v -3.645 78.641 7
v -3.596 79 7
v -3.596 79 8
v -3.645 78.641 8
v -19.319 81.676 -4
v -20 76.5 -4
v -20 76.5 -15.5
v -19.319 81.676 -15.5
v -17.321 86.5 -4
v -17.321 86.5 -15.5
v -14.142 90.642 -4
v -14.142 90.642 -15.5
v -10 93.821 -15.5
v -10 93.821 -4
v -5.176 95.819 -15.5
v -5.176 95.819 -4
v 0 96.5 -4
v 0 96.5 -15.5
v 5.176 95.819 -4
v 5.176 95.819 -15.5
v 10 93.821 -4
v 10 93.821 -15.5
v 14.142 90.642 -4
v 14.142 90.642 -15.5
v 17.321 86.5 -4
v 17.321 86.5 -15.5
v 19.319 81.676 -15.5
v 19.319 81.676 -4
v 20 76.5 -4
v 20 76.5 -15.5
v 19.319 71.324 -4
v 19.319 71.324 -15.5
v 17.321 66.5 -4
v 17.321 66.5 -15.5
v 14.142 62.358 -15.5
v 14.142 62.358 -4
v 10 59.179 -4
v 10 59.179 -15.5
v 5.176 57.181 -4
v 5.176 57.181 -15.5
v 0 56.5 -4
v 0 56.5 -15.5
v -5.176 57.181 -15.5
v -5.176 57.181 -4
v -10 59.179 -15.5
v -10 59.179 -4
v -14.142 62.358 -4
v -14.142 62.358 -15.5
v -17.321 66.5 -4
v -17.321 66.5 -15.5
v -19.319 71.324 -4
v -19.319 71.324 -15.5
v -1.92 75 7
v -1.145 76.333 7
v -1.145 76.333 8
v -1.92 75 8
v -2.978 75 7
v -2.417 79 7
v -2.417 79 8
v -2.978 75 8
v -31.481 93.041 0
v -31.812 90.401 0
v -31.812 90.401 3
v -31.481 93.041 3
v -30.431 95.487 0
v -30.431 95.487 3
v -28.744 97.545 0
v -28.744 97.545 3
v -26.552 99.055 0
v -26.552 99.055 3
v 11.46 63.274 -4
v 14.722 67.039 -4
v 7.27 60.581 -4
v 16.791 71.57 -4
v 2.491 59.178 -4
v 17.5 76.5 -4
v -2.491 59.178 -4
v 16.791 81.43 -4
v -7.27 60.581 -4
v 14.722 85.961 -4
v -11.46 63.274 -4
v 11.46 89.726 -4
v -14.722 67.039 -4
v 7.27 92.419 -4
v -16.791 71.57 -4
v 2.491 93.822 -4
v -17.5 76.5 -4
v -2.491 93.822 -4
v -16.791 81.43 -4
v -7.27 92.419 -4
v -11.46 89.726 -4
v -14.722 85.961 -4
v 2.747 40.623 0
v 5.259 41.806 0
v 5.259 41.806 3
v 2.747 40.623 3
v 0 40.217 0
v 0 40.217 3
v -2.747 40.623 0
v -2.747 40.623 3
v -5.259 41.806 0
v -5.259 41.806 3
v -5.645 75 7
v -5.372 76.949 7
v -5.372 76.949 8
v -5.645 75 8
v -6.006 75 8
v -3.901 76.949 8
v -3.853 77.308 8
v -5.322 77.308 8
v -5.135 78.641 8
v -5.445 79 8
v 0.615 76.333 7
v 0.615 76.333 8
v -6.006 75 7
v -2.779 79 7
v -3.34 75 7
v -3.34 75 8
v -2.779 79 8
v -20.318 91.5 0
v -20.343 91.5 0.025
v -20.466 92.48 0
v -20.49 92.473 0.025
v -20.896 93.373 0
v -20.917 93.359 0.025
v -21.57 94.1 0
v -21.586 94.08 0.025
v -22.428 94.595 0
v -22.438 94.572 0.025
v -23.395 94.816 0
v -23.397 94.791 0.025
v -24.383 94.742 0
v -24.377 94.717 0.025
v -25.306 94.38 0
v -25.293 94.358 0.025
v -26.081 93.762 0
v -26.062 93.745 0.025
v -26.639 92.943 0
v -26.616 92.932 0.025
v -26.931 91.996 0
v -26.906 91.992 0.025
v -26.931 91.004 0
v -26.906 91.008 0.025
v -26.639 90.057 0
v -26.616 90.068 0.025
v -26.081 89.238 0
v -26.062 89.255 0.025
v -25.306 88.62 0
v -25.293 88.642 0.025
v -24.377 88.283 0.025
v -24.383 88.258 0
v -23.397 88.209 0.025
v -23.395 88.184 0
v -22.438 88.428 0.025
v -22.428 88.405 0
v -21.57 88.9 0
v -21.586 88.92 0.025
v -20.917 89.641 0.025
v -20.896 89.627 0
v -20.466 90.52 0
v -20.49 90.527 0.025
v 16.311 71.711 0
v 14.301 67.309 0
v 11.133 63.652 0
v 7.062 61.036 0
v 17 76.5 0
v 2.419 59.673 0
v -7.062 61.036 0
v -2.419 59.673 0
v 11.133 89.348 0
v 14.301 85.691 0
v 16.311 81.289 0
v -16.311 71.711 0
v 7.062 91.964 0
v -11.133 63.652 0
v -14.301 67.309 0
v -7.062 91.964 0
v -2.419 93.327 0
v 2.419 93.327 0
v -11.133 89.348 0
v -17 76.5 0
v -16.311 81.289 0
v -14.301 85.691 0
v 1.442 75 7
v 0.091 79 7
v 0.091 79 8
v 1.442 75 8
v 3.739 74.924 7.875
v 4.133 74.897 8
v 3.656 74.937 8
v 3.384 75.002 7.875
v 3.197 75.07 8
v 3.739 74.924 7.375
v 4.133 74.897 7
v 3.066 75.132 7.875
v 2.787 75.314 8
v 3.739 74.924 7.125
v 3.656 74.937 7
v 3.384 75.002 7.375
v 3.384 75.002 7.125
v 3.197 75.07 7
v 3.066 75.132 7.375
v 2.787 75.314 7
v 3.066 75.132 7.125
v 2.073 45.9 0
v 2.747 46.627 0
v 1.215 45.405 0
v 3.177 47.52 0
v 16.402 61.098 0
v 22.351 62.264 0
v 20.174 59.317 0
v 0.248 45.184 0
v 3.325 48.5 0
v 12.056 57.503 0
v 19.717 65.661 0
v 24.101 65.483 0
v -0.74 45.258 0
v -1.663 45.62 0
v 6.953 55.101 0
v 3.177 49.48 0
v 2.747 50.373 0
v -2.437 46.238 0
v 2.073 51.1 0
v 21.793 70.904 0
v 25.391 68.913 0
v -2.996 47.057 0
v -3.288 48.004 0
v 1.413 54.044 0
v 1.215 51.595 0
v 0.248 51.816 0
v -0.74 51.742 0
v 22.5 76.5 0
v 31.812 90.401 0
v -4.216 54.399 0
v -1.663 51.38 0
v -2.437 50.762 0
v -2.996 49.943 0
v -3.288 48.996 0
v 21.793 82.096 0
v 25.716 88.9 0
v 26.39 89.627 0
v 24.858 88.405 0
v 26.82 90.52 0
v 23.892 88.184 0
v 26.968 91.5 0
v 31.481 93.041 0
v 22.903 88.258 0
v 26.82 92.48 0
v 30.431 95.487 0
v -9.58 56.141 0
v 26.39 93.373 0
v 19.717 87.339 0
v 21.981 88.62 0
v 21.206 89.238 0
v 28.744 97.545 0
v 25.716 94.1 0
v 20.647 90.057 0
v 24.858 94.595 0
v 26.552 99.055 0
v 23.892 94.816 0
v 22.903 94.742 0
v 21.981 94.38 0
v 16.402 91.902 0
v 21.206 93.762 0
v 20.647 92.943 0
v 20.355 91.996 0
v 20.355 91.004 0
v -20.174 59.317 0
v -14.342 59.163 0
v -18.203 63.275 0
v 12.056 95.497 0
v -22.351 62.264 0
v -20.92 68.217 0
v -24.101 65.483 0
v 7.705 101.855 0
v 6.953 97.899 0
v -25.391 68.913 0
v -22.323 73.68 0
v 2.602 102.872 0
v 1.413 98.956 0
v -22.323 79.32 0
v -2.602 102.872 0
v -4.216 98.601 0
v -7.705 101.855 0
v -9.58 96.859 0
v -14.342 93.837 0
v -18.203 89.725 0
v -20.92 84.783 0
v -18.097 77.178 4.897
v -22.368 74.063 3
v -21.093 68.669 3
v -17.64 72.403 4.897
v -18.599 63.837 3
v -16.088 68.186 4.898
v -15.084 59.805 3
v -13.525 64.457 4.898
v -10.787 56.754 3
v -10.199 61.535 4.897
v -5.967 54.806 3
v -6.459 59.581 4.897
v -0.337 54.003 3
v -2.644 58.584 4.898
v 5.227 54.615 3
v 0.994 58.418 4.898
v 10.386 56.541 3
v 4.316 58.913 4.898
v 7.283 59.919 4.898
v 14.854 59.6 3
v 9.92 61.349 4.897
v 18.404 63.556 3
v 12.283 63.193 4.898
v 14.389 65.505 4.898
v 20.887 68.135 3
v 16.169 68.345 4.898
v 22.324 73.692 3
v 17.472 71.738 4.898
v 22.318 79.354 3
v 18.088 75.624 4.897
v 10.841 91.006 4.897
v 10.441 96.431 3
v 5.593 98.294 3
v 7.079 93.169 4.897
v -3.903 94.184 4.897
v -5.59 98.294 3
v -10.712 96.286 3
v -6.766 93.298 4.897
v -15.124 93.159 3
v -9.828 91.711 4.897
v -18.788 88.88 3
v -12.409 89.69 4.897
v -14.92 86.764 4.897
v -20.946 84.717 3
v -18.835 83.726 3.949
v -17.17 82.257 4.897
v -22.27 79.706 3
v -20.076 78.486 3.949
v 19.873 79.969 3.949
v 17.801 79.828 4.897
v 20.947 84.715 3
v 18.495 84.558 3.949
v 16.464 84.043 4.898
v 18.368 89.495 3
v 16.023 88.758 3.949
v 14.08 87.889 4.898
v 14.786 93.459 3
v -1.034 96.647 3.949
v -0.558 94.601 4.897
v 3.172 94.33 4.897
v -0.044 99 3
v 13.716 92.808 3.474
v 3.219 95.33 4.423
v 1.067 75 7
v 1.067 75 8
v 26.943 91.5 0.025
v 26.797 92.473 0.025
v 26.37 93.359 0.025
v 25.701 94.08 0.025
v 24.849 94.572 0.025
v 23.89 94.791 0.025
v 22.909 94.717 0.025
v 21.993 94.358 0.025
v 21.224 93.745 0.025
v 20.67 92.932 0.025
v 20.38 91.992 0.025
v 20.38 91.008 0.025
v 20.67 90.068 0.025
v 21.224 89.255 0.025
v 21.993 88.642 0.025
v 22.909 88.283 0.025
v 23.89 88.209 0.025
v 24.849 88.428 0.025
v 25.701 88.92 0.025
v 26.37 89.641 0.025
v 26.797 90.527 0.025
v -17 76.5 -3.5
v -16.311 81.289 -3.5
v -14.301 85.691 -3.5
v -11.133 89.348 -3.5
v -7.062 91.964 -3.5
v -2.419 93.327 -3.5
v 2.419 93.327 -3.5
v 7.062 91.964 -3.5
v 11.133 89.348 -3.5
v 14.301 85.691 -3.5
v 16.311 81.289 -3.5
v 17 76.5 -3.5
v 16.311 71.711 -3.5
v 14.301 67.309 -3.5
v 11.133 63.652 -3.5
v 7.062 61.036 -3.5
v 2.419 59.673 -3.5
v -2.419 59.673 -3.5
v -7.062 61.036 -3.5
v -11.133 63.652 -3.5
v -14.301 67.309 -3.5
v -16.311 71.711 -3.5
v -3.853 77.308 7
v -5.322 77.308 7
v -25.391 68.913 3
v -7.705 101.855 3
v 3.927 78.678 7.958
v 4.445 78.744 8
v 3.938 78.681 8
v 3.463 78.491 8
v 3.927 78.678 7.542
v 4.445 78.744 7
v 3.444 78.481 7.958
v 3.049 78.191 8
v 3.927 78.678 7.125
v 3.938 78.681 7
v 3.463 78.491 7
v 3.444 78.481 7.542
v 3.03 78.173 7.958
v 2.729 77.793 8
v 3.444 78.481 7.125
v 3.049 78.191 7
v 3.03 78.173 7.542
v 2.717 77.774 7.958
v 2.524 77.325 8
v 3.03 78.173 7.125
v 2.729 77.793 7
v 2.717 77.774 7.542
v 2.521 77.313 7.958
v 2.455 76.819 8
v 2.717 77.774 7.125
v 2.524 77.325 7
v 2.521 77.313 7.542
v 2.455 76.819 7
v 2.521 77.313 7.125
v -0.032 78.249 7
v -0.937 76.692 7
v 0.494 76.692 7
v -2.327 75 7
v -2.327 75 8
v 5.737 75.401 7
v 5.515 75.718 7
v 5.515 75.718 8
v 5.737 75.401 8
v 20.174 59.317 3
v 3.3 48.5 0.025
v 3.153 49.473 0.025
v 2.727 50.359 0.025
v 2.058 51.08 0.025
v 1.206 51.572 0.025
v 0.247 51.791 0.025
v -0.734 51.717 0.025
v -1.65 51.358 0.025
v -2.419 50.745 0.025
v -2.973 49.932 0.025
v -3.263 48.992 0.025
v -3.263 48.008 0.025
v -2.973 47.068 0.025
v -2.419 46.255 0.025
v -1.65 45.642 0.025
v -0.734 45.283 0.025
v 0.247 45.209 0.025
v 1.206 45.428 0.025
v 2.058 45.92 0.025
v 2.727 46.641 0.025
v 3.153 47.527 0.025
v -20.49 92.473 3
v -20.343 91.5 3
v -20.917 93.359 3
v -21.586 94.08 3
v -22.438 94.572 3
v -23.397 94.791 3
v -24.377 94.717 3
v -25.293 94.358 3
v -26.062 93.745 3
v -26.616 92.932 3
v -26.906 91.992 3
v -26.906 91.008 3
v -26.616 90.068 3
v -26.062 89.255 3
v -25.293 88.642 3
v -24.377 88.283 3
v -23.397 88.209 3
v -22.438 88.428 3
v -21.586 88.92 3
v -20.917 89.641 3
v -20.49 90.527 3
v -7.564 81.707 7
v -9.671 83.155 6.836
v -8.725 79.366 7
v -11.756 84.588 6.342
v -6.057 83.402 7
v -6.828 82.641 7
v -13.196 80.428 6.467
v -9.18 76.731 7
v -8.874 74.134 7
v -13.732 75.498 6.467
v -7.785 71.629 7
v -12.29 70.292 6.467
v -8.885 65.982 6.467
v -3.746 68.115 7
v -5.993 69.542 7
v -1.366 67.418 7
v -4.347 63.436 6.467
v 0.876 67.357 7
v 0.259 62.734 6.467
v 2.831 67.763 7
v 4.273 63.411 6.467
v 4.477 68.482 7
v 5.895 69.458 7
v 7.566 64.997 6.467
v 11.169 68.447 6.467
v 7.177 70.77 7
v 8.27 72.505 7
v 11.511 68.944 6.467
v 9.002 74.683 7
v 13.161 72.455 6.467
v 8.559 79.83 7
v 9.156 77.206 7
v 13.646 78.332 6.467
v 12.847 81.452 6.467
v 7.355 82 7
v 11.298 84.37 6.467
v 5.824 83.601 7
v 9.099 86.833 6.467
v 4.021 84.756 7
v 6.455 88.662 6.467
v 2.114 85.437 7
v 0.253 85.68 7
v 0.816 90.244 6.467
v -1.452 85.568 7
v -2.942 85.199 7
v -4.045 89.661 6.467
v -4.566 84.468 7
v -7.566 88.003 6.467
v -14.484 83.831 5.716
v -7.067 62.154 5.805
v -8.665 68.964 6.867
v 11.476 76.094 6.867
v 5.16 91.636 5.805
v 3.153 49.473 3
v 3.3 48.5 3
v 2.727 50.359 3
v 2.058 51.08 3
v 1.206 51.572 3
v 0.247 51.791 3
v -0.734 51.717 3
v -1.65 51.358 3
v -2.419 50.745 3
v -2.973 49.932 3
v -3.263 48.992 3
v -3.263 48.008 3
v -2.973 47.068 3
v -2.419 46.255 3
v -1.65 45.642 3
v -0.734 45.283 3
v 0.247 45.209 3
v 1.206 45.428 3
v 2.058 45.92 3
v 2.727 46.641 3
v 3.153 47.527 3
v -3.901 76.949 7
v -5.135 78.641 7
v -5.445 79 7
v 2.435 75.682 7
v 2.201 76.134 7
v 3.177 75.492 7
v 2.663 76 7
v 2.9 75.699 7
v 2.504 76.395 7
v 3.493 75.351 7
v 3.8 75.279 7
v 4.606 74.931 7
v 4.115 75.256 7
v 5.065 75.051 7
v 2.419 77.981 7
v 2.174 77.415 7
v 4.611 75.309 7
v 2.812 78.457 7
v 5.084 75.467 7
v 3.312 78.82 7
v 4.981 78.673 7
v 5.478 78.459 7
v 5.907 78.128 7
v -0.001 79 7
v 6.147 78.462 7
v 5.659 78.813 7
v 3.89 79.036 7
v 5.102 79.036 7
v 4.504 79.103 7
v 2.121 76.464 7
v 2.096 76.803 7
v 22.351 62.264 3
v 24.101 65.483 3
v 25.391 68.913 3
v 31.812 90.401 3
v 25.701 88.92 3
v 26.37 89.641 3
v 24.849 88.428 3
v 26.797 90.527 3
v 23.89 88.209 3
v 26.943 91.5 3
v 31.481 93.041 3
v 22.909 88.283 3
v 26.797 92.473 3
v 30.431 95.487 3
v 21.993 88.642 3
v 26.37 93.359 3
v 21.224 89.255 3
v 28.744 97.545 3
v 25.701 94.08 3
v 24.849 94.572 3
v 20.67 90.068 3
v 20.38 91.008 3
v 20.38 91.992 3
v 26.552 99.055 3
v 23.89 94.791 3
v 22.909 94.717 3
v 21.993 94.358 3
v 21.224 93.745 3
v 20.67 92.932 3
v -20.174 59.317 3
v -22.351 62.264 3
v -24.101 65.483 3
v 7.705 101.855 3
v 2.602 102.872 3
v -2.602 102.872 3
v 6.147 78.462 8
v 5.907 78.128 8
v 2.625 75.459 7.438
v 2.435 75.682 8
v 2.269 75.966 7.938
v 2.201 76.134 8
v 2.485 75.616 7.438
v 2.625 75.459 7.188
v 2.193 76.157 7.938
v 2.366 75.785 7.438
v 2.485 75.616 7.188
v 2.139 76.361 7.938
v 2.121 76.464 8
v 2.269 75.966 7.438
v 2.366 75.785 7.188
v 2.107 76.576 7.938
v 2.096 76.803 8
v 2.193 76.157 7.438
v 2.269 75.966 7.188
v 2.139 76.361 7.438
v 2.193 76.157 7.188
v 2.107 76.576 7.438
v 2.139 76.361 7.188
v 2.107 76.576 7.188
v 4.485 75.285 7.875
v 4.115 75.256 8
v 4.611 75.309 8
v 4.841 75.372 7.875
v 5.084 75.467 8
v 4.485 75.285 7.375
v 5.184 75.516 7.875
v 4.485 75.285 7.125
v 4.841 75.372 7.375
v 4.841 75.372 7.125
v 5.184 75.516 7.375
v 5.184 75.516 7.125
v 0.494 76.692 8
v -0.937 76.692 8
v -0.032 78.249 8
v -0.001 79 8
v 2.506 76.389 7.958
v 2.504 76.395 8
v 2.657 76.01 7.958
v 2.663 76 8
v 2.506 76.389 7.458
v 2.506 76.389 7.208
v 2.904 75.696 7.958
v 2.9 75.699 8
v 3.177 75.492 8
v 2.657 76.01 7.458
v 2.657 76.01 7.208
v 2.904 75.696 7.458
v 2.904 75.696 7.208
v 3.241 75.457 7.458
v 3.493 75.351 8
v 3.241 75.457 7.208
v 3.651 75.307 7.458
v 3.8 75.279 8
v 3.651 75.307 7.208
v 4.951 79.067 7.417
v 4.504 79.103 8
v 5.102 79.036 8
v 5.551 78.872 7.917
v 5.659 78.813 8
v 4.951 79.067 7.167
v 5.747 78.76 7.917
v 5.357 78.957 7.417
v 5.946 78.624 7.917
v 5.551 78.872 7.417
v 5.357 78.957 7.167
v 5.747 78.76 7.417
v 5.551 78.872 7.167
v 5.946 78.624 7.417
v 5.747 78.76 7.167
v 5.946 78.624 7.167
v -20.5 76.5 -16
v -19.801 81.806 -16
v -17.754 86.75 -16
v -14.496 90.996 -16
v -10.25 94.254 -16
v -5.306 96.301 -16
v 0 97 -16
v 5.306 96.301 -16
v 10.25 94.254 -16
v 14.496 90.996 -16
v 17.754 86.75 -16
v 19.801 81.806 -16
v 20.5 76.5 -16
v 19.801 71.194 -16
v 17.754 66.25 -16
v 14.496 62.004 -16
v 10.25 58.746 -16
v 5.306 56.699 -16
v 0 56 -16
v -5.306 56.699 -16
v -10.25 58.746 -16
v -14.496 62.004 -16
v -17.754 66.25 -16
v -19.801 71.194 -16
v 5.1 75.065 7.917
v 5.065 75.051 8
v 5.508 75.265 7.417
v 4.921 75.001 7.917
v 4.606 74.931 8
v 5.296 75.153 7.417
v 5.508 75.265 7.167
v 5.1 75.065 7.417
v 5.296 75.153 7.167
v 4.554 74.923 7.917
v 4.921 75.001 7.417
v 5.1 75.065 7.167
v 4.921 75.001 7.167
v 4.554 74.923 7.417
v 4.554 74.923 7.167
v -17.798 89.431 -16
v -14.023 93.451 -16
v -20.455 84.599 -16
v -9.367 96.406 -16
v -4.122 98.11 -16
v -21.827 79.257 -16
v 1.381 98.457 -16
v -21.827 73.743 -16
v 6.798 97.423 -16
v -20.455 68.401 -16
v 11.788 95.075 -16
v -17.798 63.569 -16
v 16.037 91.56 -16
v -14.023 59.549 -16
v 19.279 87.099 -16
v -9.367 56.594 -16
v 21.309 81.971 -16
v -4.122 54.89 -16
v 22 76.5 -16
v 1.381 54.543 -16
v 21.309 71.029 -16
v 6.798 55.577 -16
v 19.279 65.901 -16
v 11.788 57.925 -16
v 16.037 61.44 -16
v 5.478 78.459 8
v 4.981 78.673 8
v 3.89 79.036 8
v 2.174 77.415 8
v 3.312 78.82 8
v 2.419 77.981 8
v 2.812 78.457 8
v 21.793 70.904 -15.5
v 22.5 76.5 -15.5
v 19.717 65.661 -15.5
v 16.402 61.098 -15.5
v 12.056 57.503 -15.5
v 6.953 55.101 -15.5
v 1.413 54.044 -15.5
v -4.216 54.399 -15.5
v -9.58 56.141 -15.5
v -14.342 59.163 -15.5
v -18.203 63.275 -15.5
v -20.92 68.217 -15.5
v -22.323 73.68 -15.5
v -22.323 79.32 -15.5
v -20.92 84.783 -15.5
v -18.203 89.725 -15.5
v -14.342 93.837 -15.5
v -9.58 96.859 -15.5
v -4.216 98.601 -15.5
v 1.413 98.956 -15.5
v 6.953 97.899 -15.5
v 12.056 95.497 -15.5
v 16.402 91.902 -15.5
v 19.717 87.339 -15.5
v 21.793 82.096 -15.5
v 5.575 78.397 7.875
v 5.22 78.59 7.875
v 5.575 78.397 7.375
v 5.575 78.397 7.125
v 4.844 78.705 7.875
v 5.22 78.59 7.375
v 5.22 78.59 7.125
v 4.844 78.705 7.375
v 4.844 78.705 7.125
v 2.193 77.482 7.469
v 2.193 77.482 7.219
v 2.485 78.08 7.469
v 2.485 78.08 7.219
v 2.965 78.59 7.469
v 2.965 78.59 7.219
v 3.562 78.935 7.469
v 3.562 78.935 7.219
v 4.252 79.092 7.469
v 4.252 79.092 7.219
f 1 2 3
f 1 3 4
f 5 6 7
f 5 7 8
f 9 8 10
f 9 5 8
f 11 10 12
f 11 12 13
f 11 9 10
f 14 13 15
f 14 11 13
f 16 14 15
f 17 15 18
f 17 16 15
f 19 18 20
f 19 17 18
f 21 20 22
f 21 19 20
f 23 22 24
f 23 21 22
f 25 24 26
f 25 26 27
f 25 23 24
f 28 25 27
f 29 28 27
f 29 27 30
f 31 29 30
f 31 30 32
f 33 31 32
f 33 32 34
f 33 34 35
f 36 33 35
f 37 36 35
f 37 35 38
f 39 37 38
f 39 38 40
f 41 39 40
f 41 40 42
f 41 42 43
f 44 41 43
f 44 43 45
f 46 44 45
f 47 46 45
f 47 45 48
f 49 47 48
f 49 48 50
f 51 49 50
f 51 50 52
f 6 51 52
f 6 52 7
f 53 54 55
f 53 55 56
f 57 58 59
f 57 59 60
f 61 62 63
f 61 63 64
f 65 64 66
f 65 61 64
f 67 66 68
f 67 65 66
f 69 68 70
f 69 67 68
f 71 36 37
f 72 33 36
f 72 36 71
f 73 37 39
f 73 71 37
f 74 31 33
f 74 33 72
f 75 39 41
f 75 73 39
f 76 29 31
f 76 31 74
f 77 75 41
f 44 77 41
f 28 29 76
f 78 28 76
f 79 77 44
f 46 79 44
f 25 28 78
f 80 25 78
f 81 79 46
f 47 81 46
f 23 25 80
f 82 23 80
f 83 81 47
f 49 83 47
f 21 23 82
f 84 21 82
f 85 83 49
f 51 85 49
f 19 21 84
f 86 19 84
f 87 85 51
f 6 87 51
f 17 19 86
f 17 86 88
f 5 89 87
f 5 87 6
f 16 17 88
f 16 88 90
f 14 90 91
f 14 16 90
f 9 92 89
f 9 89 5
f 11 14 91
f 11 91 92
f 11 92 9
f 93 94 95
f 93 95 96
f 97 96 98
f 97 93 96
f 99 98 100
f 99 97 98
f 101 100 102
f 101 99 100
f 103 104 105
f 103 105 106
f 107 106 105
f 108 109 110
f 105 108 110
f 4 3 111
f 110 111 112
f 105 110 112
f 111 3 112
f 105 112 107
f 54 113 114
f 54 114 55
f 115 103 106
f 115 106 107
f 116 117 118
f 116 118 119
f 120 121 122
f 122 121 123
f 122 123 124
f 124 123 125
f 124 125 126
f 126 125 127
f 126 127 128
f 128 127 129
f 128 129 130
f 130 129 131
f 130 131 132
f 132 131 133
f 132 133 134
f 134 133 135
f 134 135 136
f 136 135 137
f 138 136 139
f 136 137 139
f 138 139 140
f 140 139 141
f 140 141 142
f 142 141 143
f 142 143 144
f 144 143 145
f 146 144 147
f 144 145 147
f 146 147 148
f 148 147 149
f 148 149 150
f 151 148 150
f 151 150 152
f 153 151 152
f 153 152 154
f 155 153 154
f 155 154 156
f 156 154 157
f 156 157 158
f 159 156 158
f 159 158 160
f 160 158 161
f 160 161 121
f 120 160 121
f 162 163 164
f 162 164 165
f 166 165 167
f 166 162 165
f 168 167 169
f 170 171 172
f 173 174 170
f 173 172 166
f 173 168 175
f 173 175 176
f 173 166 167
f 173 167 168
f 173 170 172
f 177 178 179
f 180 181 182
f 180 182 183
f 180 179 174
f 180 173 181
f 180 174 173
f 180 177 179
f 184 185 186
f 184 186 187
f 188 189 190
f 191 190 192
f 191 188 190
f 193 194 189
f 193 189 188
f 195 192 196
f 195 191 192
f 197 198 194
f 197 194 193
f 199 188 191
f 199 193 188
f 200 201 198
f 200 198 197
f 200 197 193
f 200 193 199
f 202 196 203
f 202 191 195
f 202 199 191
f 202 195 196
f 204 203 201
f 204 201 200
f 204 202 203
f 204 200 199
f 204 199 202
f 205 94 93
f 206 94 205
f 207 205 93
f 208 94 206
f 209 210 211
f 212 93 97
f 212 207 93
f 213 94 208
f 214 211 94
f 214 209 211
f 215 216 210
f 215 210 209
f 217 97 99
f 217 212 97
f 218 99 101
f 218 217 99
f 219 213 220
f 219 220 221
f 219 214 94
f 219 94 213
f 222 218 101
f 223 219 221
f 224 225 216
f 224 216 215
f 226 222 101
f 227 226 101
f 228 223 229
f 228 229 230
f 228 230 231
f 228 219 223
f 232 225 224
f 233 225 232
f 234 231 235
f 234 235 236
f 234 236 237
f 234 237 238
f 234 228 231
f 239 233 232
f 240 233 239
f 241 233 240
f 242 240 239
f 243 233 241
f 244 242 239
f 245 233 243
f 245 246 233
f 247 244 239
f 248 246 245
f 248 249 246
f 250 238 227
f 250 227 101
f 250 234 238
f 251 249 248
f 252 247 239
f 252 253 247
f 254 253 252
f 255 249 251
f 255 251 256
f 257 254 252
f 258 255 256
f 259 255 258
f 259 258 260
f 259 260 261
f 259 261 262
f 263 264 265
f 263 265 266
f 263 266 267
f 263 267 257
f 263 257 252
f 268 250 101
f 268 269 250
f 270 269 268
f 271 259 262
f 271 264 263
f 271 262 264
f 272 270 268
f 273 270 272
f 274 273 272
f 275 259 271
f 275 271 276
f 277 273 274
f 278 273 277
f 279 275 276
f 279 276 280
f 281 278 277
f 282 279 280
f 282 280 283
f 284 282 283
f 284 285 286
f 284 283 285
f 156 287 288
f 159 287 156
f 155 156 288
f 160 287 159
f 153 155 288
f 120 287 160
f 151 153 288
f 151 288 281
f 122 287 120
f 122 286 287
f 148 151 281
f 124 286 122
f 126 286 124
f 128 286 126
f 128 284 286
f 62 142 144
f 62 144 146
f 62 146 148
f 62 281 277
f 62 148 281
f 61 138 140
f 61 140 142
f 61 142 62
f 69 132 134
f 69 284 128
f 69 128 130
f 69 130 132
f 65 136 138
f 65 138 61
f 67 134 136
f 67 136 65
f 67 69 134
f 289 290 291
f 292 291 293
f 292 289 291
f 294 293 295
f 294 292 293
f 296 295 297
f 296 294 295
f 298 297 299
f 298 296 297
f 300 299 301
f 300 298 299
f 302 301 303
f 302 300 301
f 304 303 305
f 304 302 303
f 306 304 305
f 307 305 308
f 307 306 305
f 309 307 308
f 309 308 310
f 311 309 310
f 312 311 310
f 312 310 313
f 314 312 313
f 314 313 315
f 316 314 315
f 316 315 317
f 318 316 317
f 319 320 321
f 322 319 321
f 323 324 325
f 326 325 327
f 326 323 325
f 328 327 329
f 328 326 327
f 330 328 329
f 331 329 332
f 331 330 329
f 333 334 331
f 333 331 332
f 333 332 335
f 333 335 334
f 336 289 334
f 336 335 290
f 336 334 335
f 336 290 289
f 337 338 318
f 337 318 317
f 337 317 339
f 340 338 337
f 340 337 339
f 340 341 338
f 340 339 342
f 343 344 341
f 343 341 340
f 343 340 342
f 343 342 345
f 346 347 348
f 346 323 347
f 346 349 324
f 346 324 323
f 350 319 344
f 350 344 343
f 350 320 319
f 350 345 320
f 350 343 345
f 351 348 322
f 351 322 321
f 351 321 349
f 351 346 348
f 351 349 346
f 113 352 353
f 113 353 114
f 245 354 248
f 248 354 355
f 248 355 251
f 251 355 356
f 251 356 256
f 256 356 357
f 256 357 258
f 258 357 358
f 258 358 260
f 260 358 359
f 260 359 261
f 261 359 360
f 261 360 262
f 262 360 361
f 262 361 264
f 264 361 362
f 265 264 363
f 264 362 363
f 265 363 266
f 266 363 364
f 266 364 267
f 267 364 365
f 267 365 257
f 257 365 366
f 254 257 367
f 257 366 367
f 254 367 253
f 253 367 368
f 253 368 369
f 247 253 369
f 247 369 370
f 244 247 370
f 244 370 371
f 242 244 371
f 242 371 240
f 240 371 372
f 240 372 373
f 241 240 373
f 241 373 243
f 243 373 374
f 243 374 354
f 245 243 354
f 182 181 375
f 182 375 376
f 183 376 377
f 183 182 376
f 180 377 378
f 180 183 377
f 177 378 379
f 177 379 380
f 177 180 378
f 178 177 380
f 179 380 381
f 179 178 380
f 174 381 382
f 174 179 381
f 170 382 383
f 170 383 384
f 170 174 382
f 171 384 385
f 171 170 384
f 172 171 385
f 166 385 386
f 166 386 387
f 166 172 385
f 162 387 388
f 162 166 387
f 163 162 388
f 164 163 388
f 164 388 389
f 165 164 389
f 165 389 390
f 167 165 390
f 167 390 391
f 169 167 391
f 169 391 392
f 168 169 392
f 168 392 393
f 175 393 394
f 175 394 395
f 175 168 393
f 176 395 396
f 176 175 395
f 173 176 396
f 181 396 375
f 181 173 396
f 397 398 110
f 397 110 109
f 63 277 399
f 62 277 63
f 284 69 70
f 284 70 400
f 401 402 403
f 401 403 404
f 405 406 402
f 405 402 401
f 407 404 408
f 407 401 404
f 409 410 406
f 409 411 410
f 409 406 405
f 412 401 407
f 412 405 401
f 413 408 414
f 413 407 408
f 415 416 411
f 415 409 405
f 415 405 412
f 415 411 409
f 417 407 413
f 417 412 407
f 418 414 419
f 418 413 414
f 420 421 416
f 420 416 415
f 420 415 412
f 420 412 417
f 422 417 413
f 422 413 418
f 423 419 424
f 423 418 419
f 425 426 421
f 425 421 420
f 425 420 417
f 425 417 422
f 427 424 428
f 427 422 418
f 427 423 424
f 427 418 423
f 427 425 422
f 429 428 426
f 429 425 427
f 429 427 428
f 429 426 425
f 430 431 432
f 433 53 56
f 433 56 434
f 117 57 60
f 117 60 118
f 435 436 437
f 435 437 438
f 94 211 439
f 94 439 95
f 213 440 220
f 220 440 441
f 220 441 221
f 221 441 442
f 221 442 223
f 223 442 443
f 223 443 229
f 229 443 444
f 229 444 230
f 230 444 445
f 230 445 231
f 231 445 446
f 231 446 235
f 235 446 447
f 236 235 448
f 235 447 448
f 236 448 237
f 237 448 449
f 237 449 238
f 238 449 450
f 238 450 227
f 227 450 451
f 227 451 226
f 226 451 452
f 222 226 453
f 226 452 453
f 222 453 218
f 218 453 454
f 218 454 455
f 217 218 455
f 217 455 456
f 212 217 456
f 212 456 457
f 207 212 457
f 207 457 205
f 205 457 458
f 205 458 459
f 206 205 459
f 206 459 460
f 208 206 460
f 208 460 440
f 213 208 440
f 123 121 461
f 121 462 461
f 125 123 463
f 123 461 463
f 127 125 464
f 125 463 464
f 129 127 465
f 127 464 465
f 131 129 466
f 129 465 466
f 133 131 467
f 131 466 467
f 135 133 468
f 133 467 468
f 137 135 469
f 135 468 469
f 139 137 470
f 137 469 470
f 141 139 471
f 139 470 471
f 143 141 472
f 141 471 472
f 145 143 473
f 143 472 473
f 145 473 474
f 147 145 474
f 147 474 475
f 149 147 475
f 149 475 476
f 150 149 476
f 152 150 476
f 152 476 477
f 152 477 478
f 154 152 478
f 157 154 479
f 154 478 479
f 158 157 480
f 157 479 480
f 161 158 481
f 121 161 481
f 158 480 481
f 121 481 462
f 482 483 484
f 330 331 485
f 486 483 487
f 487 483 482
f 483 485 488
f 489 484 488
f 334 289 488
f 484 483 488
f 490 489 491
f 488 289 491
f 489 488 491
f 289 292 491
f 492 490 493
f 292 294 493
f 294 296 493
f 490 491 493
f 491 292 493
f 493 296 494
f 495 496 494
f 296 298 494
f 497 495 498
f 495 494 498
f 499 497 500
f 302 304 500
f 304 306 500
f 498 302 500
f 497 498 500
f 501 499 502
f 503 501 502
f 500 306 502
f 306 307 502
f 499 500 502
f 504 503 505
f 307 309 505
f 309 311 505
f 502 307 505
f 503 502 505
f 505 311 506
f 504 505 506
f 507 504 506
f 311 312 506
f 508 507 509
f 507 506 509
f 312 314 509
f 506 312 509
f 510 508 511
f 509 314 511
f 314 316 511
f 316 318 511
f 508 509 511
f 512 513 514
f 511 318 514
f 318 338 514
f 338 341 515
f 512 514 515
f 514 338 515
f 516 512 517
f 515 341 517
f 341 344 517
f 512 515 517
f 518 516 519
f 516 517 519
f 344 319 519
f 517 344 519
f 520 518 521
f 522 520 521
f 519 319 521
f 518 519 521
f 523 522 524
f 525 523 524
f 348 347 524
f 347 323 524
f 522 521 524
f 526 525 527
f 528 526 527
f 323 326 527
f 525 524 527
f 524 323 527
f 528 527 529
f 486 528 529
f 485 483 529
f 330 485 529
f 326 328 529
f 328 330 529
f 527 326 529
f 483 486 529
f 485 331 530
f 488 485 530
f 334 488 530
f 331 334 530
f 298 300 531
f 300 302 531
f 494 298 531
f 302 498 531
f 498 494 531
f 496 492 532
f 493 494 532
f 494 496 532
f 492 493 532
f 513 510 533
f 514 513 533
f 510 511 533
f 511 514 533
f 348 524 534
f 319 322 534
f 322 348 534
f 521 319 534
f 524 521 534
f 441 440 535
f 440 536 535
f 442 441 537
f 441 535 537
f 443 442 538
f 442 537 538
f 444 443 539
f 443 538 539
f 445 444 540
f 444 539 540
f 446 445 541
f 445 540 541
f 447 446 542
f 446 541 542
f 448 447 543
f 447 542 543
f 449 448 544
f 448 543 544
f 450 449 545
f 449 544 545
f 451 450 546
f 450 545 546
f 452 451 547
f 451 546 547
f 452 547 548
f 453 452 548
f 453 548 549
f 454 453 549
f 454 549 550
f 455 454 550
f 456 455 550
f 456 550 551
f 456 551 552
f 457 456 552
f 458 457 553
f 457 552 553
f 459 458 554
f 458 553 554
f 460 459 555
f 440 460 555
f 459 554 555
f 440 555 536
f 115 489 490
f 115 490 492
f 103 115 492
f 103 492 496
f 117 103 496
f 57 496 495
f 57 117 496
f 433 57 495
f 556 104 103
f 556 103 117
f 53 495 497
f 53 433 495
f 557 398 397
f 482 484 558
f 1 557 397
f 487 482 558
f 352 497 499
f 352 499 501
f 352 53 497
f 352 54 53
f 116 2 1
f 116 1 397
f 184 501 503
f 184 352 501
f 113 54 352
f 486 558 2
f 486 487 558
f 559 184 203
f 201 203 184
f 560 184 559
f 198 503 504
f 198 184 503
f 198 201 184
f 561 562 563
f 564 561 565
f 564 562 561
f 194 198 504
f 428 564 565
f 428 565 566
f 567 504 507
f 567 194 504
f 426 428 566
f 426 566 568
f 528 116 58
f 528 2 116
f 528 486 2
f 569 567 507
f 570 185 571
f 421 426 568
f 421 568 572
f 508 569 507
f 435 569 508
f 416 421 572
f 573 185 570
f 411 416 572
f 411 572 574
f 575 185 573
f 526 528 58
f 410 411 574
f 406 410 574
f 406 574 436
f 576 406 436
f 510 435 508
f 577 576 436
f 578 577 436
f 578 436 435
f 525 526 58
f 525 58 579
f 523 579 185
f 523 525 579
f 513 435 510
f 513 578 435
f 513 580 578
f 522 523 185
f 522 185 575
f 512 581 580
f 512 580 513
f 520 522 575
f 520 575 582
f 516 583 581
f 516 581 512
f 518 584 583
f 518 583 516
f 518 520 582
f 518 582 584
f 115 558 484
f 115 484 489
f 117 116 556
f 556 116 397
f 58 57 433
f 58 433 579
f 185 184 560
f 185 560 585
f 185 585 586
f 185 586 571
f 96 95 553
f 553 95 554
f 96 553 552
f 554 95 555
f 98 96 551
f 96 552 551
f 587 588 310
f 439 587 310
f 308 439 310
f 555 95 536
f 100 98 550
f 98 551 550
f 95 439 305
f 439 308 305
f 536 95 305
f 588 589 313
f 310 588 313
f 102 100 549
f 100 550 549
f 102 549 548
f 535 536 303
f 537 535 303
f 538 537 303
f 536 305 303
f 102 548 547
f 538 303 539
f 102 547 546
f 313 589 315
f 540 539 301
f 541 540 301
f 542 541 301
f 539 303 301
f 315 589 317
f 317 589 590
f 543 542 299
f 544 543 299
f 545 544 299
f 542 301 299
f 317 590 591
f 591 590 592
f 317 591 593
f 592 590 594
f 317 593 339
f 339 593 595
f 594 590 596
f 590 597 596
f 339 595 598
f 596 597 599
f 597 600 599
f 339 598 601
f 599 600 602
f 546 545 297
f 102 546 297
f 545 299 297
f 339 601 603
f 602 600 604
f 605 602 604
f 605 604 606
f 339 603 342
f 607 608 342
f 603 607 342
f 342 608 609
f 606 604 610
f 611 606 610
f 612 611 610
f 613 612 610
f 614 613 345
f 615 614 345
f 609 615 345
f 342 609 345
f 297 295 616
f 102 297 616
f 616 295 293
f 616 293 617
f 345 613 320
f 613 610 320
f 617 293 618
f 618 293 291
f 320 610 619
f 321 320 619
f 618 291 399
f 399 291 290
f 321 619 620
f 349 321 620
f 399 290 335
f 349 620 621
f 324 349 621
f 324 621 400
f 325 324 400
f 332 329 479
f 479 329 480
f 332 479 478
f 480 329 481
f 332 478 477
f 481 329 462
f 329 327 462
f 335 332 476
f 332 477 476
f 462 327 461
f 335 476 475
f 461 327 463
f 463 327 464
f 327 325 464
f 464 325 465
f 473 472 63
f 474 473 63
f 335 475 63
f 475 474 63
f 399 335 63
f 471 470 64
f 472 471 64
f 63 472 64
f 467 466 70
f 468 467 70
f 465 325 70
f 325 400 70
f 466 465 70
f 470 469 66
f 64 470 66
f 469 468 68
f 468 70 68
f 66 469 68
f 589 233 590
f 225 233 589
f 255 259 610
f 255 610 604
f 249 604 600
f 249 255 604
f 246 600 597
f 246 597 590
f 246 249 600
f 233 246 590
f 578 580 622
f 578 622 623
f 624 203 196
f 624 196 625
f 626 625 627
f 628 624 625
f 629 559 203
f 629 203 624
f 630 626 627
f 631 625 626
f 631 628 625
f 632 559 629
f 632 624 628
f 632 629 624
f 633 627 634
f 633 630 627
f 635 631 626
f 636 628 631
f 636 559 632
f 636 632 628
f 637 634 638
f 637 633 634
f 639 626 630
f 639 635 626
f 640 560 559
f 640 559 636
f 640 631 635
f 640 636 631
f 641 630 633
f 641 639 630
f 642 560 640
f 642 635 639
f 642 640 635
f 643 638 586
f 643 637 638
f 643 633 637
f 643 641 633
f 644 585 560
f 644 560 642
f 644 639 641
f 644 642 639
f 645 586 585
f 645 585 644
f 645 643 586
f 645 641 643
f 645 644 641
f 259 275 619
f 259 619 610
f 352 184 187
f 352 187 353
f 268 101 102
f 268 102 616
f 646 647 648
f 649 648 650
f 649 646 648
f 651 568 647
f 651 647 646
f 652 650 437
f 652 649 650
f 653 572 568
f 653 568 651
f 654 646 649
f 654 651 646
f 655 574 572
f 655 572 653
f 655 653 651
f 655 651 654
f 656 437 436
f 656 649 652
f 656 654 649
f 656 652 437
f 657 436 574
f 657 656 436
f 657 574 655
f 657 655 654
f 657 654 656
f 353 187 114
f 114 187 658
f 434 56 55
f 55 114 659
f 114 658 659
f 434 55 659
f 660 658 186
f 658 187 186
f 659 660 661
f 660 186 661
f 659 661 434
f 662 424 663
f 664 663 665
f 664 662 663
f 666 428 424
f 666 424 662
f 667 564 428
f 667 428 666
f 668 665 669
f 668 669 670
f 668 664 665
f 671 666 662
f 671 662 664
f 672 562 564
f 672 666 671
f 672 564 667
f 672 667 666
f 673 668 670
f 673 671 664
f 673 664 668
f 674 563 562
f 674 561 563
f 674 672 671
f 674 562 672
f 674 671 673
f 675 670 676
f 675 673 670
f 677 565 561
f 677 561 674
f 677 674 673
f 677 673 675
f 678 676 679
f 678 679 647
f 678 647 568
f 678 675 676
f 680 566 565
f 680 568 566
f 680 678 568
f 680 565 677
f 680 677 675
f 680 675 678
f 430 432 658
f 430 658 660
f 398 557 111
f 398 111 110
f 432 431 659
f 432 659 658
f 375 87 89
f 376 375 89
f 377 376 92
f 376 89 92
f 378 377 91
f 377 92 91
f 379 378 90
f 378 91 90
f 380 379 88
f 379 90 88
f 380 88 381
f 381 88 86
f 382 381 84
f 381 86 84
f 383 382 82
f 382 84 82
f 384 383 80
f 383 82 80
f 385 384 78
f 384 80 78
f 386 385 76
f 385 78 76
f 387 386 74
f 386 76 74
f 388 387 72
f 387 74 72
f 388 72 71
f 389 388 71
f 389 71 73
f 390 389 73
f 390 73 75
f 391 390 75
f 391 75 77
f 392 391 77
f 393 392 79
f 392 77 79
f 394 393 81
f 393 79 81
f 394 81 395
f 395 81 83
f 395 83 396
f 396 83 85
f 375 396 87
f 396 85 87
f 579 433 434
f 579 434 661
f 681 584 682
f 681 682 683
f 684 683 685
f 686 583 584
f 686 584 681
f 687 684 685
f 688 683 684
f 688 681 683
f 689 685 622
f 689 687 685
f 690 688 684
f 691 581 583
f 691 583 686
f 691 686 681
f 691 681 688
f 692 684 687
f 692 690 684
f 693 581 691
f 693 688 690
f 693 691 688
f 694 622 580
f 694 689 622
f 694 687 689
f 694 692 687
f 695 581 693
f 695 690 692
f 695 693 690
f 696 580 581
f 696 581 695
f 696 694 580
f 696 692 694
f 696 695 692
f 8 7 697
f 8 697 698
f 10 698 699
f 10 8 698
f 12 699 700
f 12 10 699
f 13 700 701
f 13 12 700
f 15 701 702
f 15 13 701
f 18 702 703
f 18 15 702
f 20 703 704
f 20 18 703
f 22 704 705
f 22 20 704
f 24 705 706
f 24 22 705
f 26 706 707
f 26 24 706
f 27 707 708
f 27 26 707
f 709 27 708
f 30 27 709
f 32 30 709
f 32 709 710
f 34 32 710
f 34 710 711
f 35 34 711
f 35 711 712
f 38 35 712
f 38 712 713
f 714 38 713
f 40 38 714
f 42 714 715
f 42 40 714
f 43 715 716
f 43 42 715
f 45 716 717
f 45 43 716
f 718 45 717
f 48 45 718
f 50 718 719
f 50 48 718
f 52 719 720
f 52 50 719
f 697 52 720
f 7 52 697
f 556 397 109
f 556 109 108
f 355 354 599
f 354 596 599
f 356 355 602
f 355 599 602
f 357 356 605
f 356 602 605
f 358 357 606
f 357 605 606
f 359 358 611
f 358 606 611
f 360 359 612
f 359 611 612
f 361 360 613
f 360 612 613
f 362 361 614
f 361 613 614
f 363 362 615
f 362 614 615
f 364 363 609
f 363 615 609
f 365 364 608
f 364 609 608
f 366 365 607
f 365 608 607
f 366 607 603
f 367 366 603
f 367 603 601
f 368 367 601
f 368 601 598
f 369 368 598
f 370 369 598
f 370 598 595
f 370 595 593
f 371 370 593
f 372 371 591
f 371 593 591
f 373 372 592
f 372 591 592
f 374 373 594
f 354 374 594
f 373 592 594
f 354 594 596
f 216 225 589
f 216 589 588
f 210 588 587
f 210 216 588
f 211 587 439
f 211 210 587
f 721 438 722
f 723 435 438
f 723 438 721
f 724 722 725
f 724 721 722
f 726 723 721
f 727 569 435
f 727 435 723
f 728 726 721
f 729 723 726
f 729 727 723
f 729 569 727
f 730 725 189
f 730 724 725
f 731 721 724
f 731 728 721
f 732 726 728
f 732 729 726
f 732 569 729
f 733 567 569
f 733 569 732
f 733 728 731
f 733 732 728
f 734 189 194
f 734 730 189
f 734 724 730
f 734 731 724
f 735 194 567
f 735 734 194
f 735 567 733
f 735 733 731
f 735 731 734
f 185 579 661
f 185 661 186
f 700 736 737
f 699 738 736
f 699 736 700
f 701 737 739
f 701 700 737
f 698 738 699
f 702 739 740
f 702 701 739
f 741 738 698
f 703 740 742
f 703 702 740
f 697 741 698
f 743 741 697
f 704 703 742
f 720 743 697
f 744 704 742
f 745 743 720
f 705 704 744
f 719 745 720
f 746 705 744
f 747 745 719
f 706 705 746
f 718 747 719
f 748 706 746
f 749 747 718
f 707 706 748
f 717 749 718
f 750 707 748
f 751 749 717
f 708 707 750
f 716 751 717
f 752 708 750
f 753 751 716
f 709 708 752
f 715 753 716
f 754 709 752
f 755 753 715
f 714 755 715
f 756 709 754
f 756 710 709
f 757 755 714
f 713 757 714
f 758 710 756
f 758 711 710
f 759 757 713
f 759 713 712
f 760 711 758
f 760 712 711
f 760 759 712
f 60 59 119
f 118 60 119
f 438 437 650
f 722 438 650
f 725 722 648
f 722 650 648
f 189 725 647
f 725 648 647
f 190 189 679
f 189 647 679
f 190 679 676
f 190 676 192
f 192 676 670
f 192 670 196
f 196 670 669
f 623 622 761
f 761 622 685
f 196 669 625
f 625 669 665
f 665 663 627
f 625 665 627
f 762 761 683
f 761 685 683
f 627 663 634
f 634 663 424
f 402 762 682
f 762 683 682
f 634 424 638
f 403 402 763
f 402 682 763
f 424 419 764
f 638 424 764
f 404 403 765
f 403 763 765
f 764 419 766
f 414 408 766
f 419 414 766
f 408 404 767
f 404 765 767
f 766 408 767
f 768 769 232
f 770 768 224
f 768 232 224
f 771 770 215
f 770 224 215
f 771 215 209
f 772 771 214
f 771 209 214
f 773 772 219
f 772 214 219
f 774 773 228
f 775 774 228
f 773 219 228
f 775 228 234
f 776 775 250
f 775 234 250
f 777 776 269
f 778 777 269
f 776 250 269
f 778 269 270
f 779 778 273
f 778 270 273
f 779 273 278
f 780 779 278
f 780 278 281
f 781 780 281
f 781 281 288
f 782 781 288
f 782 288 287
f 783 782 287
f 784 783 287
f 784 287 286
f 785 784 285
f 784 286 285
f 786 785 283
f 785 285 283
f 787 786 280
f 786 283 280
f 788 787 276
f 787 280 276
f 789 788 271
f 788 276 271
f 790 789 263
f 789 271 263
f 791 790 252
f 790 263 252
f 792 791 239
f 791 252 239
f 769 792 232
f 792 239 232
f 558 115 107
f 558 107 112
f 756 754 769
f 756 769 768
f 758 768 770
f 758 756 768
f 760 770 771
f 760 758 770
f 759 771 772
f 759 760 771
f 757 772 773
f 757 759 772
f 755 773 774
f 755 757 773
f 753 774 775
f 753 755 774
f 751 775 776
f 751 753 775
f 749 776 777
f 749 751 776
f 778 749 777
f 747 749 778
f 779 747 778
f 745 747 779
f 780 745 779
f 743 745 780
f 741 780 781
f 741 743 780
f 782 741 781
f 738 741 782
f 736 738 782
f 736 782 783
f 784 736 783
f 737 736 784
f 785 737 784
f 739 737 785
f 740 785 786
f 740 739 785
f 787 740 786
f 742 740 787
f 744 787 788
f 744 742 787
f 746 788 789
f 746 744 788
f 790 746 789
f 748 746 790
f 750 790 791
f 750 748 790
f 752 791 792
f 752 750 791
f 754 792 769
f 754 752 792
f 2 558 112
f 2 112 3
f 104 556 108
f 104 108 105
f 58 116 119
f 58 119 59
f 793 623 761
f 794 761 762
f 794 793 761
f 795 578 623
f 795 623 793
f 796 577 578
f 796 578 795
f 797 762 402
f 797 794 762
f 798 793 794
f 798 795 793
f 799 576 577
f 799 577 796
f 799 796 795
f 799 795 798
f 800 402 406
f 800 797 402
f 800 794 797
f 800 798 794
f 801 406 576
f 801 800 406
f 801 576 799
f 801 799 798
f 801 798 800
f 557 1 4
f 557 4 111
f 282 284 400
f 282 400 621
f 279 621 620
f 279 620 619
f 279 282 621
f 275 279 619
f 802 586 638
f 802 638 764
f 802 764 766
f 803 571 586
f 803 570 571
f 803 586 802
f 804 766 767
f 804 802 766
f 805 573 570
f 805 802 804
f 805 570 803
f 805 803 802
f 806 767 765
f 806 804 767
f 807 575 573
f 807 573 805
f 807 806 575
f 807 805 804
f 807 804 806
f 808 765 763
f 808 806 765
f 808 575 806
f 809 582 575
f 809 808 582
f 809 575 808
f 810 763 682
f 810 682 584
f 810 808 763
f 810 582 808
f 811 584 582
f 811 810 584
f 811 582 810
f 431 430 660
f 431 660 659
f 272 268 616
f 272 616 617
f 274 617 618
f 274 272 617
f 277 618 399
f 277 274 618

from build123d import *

# Parameters (mm, degrees)
ESTRUSIONE_ESTRUSIONE2_DEPTH   = 3
RACCORDO1_R                    = 20
FORO_PER_VITE_M6_1_D           = 6.6
FORO_PER_VITE_M6_1_CSINK_D     = 6.65
FORO_PER_VITE_M6_1_CSINK_ANGLE = 90
ESTRUSIONE_ESTRUSIONE4_DEPTH   = 1
SCHIZZO13_R                    = 22.5
SCHIZZO13_R_2                  = 20
ESTRUSIONE_ESTRUSIONE5_DEPTH   = 16
SMUSSO1_SIZE                   = 0.5
SCHIZZO14_R                    = 20
SCHIZZO14_R_2                  = 17
ESTRUSIONE_ESTRUSIONE6_DEPTH   = 4
SMUSSO2_SIZE                   = 0.5


with BuildPart() as part:
    # Schizzo2 → Estrusione-Estrusione2 (new body)
    with BuildSketch(Plane.XY):
        with BuildLine():
            Line((31.811628146, 90.400572067), (25.390622586, 68.91275513))
            ThreePointArc((25.390622586, 68.91275513), (23.282129475, 63.843284505), (20.174211359, 59.317124919))
            Line((20.174211359, 59.317124919), (5.259333821, 41.805742776))
            ThreePointArc((5.259333821, 41.805742776), (0, 40.217089549), (-5.259333821, 41.805742776))
            Line((-5.259333821, 41.805742776), (-20.174211359, 59.317124919))
            ThreePointArc((-20.174211359, 59.317124919), (-23.282129475, 63.843284505), (-25.390622586, 68.91275513))
            Line((-25.390622586, 68.91275513), (-31.811628146, 90.400572067))
            ThreePointArc((-31.811628146, 90.400572067), (-30.431228874, 95.486838044), (-26.552294326, 99.054676397))
            Line((-26.552294326, 99.054676397), (-7.704995257, 101.855138495))
            ThreePointArc((-7.704995257, 101.855138495), (0, 103), (7.704995257, 101.855138495))
            Line((7.704995257, 101.855138495), (26.552294326, 99.054676397))
            ThreePointArc((26.552294326, 99.054676397), (30.431228874, 95.486838044), (31.811628146, 90.400572067))
        make_face()
    extrude(amount=ESTRUSIONE_ESTRUSIONE2_DEPTH)

    # Loft1: read off the stored shape, not the designer's step
    # Loft1: loft between two sections, ruled curve by curve
    loft1_from = [
        Edge.make_bspline([(-20.945888845, 84.717039643, 3), (-37.37996813, 42.825261952, 3), (4.51180956, 26.391182667, 3), (20.945888845, 68.282960357, 3), (37.37996813, 110.174738048, 3), (-4.51180956, 126.608817333, 3), (-20.945888845, 84.717039643, 3)], [0, 0, 0, 0, 0.5, 0.5, 0.5, 1, 1, 1, 1], 3, [1, 0.333333333, 0.333333333, 1, 0.333333333, 0.333333333, 1]),
    ]
    loft1_to = [
        Edge.make_bspline([(-8.243217943, 89.031933528, 7), (-33.307084999, 72.545497643, 7), (-16.820649113, 47.481630587, 7), (8.243217943, 63.968066472, 7), (33.307084999, 80.454502357, 7), (16.820649113, 105.518369413, 7), (-8.243217943, 89.031933528, 7)], [0, 0, 0, 0, 0.5, 0.5, 0.5, 1, 1, 1, 1], 3, [1, 0.333333333, 0.333333333, 1, 0.333333333, 0.333333333, 1]),
    ]
    loft1 = Solid(Shell([*[Face.make_surface_from_curves(loft1_from[k], loft1_to[k]) for k in range(1)], Face(Wire(loft1_from)), Face(Wire(loft1_to))]))
    add(loft1)

    # Raccordo1
    raccordo1_edges = [part.edges().sort_by_distance(p)[0] for p in [
        (8.243217943, 63.968066472, 7),
    ]]
    fillet(raccordo1_edges, radius=RACCORDO1_R)

    # Foro per Vite M6-1 (through all)
    with Locations(Plane(origin=(0, 0, 0), x_dir=(-1, 0, 0), z_dir=(0, 0, -1))):
        with Locations((-23.643180835, 91.5), (23.643180835, 91.5), (0, 48.5)):
            CounterSinkHole(FORO_PER_VITE_M6_1_D / 2, FORO_PER_VITE_M6_1_CSINK_D / 2, counter_sink_angle=FORO_PER_VITE_M6_1_CSINK_ANGLE)

    # Schizzo12 → Estrusione-Estrusione4 (add)
    # profile 1 of 4: a face of its own
    with BuildSketch(Plane.XY.offset(7)):
        Polygon((-3.596129901, 79), (-3.645008106, 78.641025641), (-5.13459144, 78.641025641), (-5.32209144, 77.307692308), (-3.852540158, 77.307692308), (-3.901418363, 76.948717949), (-5.371770927, 76.948717949), (-5.645008106, 75), (-6.006386312, 75), (-5.445488876, 79), align=None)
    # profile 2 of 4: a face of its own
    with BuildSketch(Plane.XY.offset(7)):
        Polygon((-2.778822209, 79), (-2.417444004, 79), (-2.97834144, 75), (-3.339719645, 75), align=None)
    # profile 3 of 4: a face of its own
    with BuildSketch(Plane.XY.offset(7)):
        Polygon((0.091370099, 79), (1.442331637, 75), (1.066530355, 75), (0.61540856, 76.333333333), (-1.145008106, 76.333333333), (-1.91984785, 75), (-2.326899132, 75), (-0.000777337, 79), align=None)
        Polygon((-0.032027337, 78.249198718), (-0.936674773, 76.692307692), (0.493613688, 76.692307692), align=None, mode=Mode.SUBTRACT)
    # profile 4 of 4: a face of its own
    with BuildSketch(Plane.XY.offset(7)):
        with BuildLine():
            Line((6.147459842, 78.461538462), (5.907075227, 78.128205128))
            add(Edge.make_bspline(
                [(5.907075227, 78.128205128), (5.853409068, 78.177252377), (5.748139309, 78.273461837), (5.57859512, 78.399066357), (5.403488099, 78.505445152), (5.22256522, 78.592311905), (5.036140145, 78.660469488), (4.844086397, 78.708187014), (4.646272643, 78.738264389), (4.512418126, 78.741801319), (4.444735483, 78.743589744)],
                knots=[0, 0, 0, 0, 1.071509858, 2.101838265, 3.105566767, 4.088534008, 5.056617788, 6.027134063, 7.002433514, 8, 8, 8, 8], degree=3))
            add(Edge.make_bspline(
                [(4.444735483, 78.743589744), (4.400373208, 78.742812621), (4.312286158, 78.741269543), (4.181334262, 78.729117344), (4.052913927, 78.708126456), (3.926602012, 78.679162503), (3.802411907, 78.64228048), (3.680155963, 78.597516258), (3.56054902, 78.543286131), (3.443628937, 78.482044458), (3.330601048, 78.414350152), (3.22428905, 78.33952652), (3.12333878, 78.259946704), (3.028834556, 78.174521349), (2.941380069, 78.082399604), (2.859264786, 77.98583622), (2.78482907, 77.882456135), (2.716015178, 77.774823109), (2.654558753, 77.663275365), (2.601448097, 77.548895655), (2.556421412, 77.432470171), (2.519611274, 77.31384374), (2.490613909, 77.193141896), (2.46962503, 77.070318011), (2.457497057, 76.945226207), (2.455936033, 76.861136633), (2.45515215, 76.818910256)],
                knots=[0, 0, 0, 0, 1.038808894, 2.06268977, 3.07662516, 4.084154014, 5.095481367, 6.108721937, 7.130613802, 8.168612606, 9.198437467, 10.213568377, 11.210969095, 12.207329739, 13.193903721, 14.183803377, 15.173465855, 16.174683957, 17.174102854, 18.153572289, 19.125845025, 20.09527659, 21.060177321, 22.030919679, 23.011207659, 24, 24, 24, 24], degree=3))
            add(Edge.make_bspline(
                [(2.45515215, 76.818910256), (2.455723998, 76.781491738), (2.456853287, 76.707597462), (2.467137224, 76.598513496), (2.481582904, 76.492331052), (2.504695805, 76.389786519), (2.532296075, 76.289652842), (2.567790414, 76.19322547), (2.608704098, 76.099685037), (2.655827766, 76.009788748), (2.709981947, 75.9244307), (2.767825544, 75.84203868), (2.833376205, 75.766228724), (2.903469648, 75.69420712), (2.979271851, 75.626878672), (3.06172917, 75.565604987), (3.148109174, 75.50693934), (3.241284048, 75.455918021), (3.337713946, 75.407825191), (3.439192633, 75.368472345), (3.543314355, 75.333536855), (3.651321135, 75.30582883), (3.762449094, 75.282865419), (3.877406714, 75.268399012), (3.995297146, 75.258117436), (4.075054043, 75.256983827), (4.11540856, 75.256410256)],
                knots=[0, 0, 0, 0, 1.050288761, 2.074115449, 3.074185512, 4.056755159, 5.022963132, 5.98847243, 6.938717655, 7.888015535, 8.834733031, 9.775342319, 10.711547043, 11.644864095, 12.595819208, 13.554196408, 14.527565762, 15.524707521, 16.534208059, 17.550758617, 18.577574426, 19.616152416, 20.679451723, 21.761233178, 22.867253411, 24, 24, 24, 24], degree=3))
            add(Edge.make_bspline(
                [(4.11540856, 75.256410256), (4.177436651, 75.257790942), (4.301068501, 75.260542869), (4.484631477, 75.282868048), (4.664978891, 75.318865819), (4.842002444, 75.369810901), (5.016050431, 75.43453316), (5.186569599, 75.514843771), (5.354579597, 75.607897574), (5.461316993, 75.681008093), (5.515248304, 75.717948718)],
                knots=[0, 0, 0, 0, 0.99335309, 1.979910703, 2.957437189, 3.936535413, 4.927536167, 5.928599034, 6.953381172, 8, 8, 8, 8], degree=3))
            Line((5.515248304, 75.717948718), (5.737203432, 75.401442308))
            add(Edge.make_bspline(
                [(5.737203432, 75.401442308), (5.698636022, 75.377400999), (5.623207082, 75.330381758), (5.510173423, 75.266138874), (5.402305276, 75.206488418), (5.298337121, 75.153355463), (5.198579513, 75.105882334), (5.1023715, 75.065337735), (5.011000051, 75.029494384), (4.892992217, 74.990590306), (4.74133145, 74.952952634), (4.550453852, 74.92005811), (4.346035685, 74.900897129), (4.205459903, 74.898612773), (4.133036765, 74.897435897)],
                knots=[0, 0, 0, 0, 0.95718736, 1.872037221, 2.738173064, 3.553405217, 4.331061281, 5.064628489, 5.752111019, 6.397930214, 7.680580555, 9.03930081, 10.474679465, 12, 12, 12, 12], degree=3))
            add(Edge.make_bspline(
                [(4.133036765, 74.897435897), (4.065668797, 74.898503504), (3.933826188, 74.900592864), (3.741149364, 74.921710204), (3.557866827, 74.95258651), (3.384436033, 74.999139462), (3.219772984, 75.056693596), (3.065642403, 75.129864143), (2.919625803, 75.213209751), (2.831076482, 75.280512719), (2.786882919, 75.314102564)],
                knots=[0, 0, 0, 0, 1.124936831, 2.201559726, 3.234383979, 4.226808245, 5.197736629, 6.143845973, 7.073622924, 8, 8, 8, 8], degree=3))
            add(Edge.make_bspline(
                [(2.786882919, 75.314102564), (2.758885291, 75.337621958), (2.703394402, 75.384237053), (2.62470229, 75.457997227), (2.551570012, 75.534983994), (2.484244847, 75.615533524), (2.42157733, 75.698321851), (2.365717698, 75.784759584), (2.313562827, 75.872994881), (2.268800829, 75.96512557), (2.22697839, 76.059317323), (2.192210864, 76.156942995), (2.16224319, 76.257459522), (2.138526146, 76.361127608), (2.119099109, 76.4674919), (2.105596966, 76.576905953), (2.097360113, 76.688973096), (2.09657437, 76.764675934), (2.096177791, 76.802884615)],
                knots=[0, 0, 0, 0, 1.031438255, 2.044295521, 3.04101972, 4.02510288, 5.004675323, 5.96814667, 6.927099159, 7.894246712, 8.855978008, 9.833229186, 10.815522105, 11.813498757, 12.831862773, 13.86462134, 14.922233219, 16, 16, 16, 16], degree=3))
            add(Edge.make_bspline(
                [(2.096177791, 76.802884615), (2.096577495, 76.842428296), (2.097372344, 76.921064649), (2.105650778, 77.037926676), (2.119089644, 77.152678707), (2.138604556, 77.264900109), (2.162372252, 77.374931575), (2.192108962, 77.482456198), (2.227496183, 77.587819052), (2.26846739, 77.690912174), (2.313946089, 77.792253604), (2.365597569, 77.890641468), (2.421437188, 77.987446425), (2.484309495, 78.080807656), (2.551867712, 78.172560242), (2.624363598, 78.262330978), (2.703619519, 78.348673131), (2.786172336, 78.433454544), (2.873429547, 78.514127778), (2.963688628, 78.590231175), (3.057030633, 78.660704389), (3.152310494, 78.726903249), (3.250787182, 78.786579776), (3.351531447, 78.841522422), (3.455054871, 78.891215855), (3.561207816, 78.935892226), (3.669937102, 78.975588021), (3.781394211, 79.008879856), (3.895516006, 79.0378999), (4.012061865, 79.061869924), (4.131310009, 79.08051087), (4.253292706, 79.092904794), (4.377840673, 79.101419939), (4.461815011, 79.102181335), (4.504030355, 79.102564103)],
                knots=[0, 0, 0, 0, 1.022044487, 2.032432208, 3.026697584, 4.007398125, 4.975698324, 5.935493653, 6.889610259, 7.847342231, 8.802158043, 9.759466851, 10.718641154, 11.689497925, 12.667180171, 13.663528933, 14.670419348, 15.695700261, 16.721678344, 17.740943913, 18.746223377, 19.744006424, 20.738655278, 21.721128384, 22.709310215, 23.705658978, 24.697235847, 25.699785021, 26.711210149, 27.740296491, 28.77439654, 29.829646392, 30.908925919, 32, 32, 32, 32], degree=3))
            add(Edge.make_bspline(
                [(4.504030355, 79.102564103), (4.580506116, 79.101020619), (4.730225931, 79.097998876), (4.949594324, 79.069889673), (5.158458449, 79.024831724), (5.324999268, 78.970585793), (5.454290614, 78.917658056), (5.552043217, 78.87243398), (5.649557753, 78.818839919), (5.748433722, 78.760454716), (5.84769365, 78.695580135), (5.947481515, 78.623682671), (6.04797544, 78.545625981), (6.1139998, 78.48982), (6.147459842, 78.461538462)],
                knots=[0, 0, 0, 0, 1.522680585, 2.981015879, 4.397098697, 5.773315249, 6.462902712, 7.179304435, 7.917249996, 8.678195189, 9.466166505, 10.278195975, 11.127418496, 12, 12, 12, 12], degree=3))
        make_face()
    extrude(amount=ESTRUSIONE_ESTRUSIONE4_DEPTH)

    # Schizzo13 → Estrusione-Estrusione5 (add)
    with BuildSketch(Plane(origin=(0, 0, 0), x_dir=(-1, 0, 0), z_dir=(0, 0, -1))):
        with Locations(Location((0, 76.5, 0), (0, 0, 180))):
            Circle(SCHIZZO13_R)
        with Locations((0, 76.5)):
            Circle(SCHIZZO13_R_2, mode=Mode.SUBTRACT)
    extrude(amount=ESTRUSIONE_ESTRUSIONE5_DEPTH)

    # Smusso1
    smusso1_edges = [part.edges().sort_by_distance(p)[0] for p in [
        (-22.5, 76.5, -16),
        (20, 76.5, -16),
    ]]
    chamfer(smusso1_edges, length=SMUSSO1_SIZE)

    # Schizzo14 → Estrusione-Estrusione6 (add)
    with BuildSketch(Plane(origin=(0, 0, 0), x_dir=(-1, 0, 0), z_dir=(0, 0, -1))):
        with Locations((0, 76.5)):
            Circle(SCHIZZO14_R)
        with Locations((0, 76.5)):
            Circle(SCHIZZO14_R_2, mode=Mode.SUBTRACT)
    extrude(amount=ESTRUSIONE_ESTRUSIONE6_DEPTH)

    # Smusso2
    smusso2_edges = [part.edges().sort_by_distance(p)[0] for p in [
        (17, 76.5, -4),
    ]]
    chamfer(smusso2_edges, length=SMUSSO2_SIZE)


solid = part.part
